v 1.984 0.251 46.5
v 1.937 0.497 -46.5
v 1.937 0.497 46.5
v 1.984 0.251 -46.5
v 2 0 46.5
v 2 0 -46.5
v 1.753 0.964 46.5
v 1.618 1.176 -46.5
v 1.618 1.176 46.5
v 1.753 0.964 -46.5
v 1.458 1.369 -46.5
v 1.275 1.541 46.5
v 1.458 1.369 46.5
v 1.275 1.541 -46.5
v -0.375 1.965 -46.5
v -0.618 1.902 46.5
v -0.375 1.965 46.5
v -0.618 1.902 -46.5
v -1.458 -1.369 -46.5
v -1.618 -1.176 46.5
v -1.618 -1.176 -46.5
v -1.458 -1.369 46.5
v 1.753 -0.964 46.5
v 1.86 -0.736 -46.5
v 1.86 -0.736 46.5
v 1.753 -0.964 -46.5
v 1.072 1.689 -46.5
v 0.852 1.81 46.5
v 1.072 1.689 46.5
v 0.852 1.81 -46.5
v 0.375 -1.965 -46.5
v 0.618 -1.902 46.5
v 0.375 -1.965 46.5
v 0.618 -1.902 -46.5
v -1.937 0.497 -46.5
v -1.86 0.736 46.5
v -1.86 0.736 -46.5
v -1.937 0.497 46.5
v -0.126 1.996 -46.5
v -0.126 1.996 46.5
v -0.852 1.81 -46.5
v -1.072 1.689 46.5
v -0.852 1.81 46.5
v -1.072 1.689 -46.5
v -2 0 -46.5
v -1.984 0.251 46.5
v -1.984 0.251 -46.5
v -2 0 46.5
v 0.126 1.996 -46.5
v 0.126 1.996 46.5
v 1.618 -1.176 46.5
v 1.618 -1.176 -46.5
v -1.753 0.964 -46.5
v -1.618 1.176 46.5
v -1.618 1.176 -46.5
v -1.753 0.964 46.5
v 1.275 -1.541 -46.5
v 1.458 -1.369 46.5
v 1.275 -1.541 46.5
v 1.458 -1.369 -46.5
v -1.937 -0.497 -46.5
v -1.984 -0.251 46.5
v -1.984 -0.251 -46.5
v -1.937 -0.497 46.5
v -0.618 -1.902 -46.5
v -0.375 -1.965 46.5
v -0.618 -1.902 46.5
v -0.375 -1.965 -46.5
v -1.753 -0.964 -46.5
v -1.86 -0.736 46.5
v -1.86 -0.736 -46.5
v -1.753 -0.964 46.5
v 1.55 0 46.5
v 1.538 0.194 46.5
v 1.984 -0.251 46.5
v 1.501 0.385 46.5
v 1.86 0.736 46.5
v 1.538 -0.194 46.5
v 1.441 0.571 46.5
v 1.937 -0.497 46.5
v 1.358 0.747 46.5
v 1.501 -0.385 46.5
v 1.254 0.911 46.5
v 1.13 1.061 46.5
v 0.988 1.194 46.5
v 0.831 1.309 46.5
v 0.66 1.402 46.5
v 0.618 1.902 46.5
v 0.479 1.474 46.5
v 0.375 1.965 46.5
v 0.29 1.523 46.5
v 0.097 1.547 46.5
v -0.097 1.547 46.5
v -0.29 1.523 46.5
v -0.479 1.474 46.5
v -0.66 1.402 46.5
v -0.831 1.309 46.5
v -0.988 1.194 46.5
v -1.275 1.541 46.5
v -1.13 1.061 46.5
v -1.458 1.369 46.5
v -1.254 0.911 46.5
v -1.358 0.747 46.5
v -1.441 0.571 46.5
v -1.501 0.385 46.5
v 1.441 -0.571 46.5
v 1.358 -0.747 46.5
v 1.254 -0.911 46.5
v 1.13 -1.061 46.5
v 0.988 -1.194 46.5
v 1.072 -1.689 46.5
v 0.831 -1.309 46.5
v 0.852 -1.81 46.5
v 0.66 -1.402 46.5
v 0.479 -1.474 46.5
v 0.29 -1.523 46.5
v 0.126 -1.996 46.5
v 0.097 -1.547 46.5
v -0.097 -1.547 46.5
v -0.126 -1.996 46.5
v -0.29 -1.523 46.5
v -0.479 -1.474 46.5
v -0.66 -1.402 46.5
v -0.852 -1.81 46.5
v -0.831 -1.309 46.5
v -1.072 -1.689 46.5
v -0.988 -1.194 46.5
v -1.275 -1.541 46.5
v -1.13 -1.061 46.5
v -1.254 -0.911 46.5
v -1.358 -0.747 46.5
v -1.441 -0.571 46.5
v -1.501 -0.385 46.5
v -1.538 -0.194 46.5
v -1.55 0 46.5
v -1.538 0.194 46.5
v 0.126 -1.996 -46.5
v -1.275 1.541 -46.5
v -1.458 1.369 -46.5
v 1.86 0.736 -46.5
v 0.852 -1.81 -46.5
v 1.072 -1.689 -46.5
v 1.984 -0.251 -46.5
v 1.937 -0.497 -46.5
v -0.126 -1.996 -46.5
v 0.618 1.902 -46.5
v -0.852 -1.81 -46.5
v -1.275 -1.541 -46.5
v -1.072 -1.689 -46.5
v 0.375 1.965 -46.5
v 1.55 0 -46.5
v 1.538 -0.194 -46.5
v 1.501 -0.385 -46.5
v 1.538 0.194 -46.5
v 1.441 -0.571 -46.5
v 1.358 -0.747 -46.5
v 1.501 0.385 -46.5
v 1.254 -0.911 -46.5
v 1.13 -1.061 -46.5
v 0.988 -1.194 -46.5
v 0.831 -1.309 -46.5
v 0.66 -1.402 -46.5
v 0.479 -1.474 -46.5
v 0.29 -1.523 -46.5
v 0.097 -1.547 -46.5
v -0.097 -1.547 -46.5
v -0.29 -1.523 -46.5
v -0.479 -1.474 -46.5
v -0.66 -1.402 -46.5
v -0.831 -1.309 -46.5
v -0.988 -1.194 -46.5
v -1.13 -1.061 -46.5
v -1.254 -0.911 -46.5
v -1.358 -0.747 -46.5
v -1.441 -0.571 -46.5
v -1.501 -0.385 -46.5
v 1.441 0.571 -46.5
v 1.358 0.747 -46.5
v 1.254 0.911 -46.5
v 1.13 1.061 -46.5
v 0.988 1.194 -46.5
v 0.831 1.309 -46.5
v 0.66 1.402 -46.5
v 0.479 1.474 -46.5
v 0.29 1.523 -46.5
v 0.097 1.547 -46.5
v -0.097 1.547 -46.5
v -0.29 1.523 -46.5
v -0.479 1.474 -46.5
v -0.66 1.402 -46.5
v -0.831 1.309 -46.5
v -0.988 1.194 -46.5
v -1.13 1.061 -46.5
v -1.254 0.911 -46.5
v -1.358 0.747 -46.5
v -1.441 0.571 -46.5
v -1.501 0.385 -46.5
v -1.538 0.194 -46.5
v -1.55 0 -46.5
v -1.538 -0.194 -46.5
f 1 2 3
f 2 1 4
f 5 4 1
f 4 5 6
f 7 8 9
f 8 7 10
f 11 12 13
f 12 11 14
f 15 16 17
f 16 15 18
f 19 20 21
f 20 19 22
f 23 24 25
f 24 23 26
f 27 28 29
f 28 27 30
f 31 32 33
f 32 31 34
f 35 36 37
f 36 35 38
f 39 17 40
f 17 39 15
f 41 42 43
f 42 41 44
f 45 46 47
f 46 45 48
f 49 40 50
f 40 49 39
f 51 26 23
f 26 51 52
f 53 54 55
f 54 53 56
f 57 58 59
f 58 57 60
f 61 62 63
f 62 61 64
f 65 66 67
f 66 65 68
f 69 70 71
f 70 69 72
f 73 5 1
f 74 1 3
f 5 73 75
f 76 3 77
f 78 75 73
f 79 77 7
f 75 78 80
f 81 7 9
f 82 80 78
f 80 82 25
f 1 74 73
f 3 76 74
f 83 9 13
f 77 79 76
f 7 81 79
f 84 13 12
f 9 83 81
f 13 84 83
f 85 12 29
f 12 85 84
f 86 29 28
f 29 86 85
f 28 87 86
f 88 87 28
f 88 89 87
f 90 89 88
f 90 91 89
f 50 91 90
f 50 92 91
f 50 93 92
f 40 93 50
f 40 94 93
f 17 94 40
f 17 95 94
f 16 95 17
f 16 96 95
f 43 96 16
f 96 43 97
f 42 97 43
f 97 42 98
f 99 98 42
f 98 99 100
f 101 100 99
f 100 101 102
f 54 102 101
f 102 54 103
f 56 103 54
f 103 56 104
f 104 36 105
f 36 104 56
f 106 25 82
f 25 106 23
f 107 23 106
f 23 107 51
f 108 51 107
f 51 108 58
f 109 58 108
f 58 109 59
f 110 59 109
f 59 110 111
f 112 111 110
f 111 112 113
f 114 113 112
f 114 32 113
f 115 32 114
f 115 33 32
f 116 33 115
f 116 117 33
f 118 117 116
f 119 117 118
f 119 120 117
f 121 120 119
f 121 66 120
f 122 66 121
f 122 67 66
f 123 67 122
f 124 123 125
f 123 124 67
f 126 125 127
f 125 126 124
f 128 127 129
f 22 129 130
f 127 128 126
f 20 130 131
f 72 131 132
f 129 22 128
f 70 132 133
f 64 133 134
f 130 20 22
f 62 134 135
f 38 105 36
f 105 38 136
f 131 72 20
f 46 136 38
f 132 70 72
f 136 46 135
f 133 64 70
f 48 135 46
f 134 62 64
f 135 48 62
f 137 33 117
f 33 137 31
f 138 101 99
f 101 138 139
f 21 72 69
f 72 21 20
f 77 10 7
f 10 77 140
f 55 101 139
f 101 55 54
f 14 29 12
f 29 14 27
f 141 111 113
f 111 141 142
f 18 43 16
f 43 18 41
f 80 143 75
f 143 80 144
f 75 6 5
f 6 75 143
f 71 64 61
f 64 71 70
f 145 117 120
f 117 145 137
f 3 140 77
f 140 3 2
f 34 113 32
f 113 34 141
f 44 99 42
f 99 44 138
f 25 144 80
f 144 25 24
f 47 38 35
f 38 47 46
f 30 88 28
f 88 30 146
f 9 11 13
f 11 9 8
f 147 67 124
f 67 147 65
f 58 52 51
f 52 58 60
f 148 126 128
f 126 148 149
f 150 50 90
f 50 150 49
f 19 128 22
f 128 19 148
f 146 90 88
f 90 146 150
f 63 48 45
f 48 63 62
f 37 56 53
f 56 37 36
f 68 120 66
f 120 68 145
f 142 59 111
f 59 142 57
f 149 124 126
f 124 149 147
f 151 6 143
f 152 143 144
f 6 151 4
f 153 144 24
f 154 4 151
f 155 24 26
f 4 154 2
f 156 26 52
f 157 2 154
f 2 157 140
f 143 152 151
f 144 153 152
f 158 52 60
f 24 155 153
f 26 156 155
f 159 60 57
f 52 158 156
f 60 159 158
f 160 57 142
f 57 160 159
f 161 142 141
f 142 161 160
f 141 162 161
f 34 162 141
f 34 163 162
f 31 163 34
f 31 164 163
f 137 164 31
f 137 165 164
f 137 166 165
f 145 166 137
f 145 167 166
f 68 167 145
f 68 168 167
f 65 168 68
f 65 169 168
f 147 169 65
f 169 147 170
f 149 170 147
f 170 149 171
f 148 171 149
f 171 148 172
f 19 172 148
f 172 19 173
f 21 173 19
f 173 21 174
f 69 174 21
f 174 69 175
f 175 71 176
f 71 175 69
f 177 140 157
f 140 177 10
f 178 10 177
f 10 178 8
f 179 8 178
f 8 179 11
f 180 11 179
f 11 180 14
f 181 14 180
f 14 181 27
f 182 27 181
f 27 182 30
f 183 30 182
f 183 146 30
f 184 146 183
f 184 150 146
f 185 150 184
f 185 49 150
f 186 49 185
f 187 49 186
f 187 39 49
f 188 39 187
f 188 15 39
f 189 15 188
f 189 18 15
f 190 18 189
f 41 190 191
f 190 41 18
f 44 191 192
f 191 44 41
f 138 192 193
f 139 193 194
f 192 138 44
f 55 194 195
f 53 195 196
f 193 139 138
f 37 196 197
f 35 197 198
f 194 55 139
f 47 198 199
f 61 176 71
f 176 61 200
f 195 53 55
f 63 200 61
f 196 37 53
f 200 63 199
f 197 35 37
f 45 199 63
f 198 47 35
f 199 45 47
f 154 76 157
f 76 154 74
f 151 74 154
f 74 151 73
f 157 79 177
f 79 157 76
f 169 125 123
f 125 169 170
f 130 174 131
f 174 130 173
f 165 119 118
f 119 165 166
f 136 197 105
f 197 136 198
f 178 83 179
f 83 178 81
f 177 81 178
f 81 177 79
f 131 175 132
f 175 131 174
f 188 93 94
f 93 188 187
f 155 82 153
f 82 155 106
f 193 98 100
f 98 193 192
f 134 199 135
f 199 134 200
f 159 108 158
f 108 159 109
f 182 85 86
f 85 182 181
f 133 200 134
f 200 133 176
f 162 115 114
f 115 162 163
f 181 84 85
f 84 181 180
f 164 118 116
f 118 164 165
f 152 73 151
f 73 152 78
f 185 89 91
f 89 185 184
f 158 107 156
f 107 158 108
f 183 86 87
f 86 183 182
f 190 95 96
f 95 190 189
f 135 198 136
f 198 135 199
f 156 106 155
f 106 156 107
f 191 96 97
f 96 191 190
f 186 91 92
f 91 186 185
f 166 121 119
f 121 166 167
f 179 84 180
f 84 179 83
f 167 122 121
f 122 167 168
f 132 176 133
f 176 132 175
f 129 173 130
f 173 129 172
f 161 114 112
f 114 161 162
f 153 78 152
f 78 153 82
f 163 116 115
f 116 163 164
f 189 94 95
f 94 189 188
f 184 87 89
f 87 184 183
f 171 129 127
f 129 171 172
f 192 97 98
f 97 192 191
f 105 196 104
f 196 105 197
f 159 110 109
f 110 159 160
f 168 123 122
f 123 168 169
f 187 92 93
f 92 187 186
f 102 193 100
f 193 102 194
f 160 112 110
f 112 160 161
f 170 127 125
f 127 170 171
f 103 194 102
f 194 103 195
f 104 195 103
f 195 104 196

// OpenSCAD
$fn = 50;


difference() {
	union() {
		translate(v = [0, 0, -46.5000000000]) {
			cylinder(h = 93, r = 2.0000000000);
		}
	}
	union() {
		translate(v = [0, 0, -100.0000000000]) {
			cylinder(h = 200, r = 1.5500000000);
		}
	}
}
